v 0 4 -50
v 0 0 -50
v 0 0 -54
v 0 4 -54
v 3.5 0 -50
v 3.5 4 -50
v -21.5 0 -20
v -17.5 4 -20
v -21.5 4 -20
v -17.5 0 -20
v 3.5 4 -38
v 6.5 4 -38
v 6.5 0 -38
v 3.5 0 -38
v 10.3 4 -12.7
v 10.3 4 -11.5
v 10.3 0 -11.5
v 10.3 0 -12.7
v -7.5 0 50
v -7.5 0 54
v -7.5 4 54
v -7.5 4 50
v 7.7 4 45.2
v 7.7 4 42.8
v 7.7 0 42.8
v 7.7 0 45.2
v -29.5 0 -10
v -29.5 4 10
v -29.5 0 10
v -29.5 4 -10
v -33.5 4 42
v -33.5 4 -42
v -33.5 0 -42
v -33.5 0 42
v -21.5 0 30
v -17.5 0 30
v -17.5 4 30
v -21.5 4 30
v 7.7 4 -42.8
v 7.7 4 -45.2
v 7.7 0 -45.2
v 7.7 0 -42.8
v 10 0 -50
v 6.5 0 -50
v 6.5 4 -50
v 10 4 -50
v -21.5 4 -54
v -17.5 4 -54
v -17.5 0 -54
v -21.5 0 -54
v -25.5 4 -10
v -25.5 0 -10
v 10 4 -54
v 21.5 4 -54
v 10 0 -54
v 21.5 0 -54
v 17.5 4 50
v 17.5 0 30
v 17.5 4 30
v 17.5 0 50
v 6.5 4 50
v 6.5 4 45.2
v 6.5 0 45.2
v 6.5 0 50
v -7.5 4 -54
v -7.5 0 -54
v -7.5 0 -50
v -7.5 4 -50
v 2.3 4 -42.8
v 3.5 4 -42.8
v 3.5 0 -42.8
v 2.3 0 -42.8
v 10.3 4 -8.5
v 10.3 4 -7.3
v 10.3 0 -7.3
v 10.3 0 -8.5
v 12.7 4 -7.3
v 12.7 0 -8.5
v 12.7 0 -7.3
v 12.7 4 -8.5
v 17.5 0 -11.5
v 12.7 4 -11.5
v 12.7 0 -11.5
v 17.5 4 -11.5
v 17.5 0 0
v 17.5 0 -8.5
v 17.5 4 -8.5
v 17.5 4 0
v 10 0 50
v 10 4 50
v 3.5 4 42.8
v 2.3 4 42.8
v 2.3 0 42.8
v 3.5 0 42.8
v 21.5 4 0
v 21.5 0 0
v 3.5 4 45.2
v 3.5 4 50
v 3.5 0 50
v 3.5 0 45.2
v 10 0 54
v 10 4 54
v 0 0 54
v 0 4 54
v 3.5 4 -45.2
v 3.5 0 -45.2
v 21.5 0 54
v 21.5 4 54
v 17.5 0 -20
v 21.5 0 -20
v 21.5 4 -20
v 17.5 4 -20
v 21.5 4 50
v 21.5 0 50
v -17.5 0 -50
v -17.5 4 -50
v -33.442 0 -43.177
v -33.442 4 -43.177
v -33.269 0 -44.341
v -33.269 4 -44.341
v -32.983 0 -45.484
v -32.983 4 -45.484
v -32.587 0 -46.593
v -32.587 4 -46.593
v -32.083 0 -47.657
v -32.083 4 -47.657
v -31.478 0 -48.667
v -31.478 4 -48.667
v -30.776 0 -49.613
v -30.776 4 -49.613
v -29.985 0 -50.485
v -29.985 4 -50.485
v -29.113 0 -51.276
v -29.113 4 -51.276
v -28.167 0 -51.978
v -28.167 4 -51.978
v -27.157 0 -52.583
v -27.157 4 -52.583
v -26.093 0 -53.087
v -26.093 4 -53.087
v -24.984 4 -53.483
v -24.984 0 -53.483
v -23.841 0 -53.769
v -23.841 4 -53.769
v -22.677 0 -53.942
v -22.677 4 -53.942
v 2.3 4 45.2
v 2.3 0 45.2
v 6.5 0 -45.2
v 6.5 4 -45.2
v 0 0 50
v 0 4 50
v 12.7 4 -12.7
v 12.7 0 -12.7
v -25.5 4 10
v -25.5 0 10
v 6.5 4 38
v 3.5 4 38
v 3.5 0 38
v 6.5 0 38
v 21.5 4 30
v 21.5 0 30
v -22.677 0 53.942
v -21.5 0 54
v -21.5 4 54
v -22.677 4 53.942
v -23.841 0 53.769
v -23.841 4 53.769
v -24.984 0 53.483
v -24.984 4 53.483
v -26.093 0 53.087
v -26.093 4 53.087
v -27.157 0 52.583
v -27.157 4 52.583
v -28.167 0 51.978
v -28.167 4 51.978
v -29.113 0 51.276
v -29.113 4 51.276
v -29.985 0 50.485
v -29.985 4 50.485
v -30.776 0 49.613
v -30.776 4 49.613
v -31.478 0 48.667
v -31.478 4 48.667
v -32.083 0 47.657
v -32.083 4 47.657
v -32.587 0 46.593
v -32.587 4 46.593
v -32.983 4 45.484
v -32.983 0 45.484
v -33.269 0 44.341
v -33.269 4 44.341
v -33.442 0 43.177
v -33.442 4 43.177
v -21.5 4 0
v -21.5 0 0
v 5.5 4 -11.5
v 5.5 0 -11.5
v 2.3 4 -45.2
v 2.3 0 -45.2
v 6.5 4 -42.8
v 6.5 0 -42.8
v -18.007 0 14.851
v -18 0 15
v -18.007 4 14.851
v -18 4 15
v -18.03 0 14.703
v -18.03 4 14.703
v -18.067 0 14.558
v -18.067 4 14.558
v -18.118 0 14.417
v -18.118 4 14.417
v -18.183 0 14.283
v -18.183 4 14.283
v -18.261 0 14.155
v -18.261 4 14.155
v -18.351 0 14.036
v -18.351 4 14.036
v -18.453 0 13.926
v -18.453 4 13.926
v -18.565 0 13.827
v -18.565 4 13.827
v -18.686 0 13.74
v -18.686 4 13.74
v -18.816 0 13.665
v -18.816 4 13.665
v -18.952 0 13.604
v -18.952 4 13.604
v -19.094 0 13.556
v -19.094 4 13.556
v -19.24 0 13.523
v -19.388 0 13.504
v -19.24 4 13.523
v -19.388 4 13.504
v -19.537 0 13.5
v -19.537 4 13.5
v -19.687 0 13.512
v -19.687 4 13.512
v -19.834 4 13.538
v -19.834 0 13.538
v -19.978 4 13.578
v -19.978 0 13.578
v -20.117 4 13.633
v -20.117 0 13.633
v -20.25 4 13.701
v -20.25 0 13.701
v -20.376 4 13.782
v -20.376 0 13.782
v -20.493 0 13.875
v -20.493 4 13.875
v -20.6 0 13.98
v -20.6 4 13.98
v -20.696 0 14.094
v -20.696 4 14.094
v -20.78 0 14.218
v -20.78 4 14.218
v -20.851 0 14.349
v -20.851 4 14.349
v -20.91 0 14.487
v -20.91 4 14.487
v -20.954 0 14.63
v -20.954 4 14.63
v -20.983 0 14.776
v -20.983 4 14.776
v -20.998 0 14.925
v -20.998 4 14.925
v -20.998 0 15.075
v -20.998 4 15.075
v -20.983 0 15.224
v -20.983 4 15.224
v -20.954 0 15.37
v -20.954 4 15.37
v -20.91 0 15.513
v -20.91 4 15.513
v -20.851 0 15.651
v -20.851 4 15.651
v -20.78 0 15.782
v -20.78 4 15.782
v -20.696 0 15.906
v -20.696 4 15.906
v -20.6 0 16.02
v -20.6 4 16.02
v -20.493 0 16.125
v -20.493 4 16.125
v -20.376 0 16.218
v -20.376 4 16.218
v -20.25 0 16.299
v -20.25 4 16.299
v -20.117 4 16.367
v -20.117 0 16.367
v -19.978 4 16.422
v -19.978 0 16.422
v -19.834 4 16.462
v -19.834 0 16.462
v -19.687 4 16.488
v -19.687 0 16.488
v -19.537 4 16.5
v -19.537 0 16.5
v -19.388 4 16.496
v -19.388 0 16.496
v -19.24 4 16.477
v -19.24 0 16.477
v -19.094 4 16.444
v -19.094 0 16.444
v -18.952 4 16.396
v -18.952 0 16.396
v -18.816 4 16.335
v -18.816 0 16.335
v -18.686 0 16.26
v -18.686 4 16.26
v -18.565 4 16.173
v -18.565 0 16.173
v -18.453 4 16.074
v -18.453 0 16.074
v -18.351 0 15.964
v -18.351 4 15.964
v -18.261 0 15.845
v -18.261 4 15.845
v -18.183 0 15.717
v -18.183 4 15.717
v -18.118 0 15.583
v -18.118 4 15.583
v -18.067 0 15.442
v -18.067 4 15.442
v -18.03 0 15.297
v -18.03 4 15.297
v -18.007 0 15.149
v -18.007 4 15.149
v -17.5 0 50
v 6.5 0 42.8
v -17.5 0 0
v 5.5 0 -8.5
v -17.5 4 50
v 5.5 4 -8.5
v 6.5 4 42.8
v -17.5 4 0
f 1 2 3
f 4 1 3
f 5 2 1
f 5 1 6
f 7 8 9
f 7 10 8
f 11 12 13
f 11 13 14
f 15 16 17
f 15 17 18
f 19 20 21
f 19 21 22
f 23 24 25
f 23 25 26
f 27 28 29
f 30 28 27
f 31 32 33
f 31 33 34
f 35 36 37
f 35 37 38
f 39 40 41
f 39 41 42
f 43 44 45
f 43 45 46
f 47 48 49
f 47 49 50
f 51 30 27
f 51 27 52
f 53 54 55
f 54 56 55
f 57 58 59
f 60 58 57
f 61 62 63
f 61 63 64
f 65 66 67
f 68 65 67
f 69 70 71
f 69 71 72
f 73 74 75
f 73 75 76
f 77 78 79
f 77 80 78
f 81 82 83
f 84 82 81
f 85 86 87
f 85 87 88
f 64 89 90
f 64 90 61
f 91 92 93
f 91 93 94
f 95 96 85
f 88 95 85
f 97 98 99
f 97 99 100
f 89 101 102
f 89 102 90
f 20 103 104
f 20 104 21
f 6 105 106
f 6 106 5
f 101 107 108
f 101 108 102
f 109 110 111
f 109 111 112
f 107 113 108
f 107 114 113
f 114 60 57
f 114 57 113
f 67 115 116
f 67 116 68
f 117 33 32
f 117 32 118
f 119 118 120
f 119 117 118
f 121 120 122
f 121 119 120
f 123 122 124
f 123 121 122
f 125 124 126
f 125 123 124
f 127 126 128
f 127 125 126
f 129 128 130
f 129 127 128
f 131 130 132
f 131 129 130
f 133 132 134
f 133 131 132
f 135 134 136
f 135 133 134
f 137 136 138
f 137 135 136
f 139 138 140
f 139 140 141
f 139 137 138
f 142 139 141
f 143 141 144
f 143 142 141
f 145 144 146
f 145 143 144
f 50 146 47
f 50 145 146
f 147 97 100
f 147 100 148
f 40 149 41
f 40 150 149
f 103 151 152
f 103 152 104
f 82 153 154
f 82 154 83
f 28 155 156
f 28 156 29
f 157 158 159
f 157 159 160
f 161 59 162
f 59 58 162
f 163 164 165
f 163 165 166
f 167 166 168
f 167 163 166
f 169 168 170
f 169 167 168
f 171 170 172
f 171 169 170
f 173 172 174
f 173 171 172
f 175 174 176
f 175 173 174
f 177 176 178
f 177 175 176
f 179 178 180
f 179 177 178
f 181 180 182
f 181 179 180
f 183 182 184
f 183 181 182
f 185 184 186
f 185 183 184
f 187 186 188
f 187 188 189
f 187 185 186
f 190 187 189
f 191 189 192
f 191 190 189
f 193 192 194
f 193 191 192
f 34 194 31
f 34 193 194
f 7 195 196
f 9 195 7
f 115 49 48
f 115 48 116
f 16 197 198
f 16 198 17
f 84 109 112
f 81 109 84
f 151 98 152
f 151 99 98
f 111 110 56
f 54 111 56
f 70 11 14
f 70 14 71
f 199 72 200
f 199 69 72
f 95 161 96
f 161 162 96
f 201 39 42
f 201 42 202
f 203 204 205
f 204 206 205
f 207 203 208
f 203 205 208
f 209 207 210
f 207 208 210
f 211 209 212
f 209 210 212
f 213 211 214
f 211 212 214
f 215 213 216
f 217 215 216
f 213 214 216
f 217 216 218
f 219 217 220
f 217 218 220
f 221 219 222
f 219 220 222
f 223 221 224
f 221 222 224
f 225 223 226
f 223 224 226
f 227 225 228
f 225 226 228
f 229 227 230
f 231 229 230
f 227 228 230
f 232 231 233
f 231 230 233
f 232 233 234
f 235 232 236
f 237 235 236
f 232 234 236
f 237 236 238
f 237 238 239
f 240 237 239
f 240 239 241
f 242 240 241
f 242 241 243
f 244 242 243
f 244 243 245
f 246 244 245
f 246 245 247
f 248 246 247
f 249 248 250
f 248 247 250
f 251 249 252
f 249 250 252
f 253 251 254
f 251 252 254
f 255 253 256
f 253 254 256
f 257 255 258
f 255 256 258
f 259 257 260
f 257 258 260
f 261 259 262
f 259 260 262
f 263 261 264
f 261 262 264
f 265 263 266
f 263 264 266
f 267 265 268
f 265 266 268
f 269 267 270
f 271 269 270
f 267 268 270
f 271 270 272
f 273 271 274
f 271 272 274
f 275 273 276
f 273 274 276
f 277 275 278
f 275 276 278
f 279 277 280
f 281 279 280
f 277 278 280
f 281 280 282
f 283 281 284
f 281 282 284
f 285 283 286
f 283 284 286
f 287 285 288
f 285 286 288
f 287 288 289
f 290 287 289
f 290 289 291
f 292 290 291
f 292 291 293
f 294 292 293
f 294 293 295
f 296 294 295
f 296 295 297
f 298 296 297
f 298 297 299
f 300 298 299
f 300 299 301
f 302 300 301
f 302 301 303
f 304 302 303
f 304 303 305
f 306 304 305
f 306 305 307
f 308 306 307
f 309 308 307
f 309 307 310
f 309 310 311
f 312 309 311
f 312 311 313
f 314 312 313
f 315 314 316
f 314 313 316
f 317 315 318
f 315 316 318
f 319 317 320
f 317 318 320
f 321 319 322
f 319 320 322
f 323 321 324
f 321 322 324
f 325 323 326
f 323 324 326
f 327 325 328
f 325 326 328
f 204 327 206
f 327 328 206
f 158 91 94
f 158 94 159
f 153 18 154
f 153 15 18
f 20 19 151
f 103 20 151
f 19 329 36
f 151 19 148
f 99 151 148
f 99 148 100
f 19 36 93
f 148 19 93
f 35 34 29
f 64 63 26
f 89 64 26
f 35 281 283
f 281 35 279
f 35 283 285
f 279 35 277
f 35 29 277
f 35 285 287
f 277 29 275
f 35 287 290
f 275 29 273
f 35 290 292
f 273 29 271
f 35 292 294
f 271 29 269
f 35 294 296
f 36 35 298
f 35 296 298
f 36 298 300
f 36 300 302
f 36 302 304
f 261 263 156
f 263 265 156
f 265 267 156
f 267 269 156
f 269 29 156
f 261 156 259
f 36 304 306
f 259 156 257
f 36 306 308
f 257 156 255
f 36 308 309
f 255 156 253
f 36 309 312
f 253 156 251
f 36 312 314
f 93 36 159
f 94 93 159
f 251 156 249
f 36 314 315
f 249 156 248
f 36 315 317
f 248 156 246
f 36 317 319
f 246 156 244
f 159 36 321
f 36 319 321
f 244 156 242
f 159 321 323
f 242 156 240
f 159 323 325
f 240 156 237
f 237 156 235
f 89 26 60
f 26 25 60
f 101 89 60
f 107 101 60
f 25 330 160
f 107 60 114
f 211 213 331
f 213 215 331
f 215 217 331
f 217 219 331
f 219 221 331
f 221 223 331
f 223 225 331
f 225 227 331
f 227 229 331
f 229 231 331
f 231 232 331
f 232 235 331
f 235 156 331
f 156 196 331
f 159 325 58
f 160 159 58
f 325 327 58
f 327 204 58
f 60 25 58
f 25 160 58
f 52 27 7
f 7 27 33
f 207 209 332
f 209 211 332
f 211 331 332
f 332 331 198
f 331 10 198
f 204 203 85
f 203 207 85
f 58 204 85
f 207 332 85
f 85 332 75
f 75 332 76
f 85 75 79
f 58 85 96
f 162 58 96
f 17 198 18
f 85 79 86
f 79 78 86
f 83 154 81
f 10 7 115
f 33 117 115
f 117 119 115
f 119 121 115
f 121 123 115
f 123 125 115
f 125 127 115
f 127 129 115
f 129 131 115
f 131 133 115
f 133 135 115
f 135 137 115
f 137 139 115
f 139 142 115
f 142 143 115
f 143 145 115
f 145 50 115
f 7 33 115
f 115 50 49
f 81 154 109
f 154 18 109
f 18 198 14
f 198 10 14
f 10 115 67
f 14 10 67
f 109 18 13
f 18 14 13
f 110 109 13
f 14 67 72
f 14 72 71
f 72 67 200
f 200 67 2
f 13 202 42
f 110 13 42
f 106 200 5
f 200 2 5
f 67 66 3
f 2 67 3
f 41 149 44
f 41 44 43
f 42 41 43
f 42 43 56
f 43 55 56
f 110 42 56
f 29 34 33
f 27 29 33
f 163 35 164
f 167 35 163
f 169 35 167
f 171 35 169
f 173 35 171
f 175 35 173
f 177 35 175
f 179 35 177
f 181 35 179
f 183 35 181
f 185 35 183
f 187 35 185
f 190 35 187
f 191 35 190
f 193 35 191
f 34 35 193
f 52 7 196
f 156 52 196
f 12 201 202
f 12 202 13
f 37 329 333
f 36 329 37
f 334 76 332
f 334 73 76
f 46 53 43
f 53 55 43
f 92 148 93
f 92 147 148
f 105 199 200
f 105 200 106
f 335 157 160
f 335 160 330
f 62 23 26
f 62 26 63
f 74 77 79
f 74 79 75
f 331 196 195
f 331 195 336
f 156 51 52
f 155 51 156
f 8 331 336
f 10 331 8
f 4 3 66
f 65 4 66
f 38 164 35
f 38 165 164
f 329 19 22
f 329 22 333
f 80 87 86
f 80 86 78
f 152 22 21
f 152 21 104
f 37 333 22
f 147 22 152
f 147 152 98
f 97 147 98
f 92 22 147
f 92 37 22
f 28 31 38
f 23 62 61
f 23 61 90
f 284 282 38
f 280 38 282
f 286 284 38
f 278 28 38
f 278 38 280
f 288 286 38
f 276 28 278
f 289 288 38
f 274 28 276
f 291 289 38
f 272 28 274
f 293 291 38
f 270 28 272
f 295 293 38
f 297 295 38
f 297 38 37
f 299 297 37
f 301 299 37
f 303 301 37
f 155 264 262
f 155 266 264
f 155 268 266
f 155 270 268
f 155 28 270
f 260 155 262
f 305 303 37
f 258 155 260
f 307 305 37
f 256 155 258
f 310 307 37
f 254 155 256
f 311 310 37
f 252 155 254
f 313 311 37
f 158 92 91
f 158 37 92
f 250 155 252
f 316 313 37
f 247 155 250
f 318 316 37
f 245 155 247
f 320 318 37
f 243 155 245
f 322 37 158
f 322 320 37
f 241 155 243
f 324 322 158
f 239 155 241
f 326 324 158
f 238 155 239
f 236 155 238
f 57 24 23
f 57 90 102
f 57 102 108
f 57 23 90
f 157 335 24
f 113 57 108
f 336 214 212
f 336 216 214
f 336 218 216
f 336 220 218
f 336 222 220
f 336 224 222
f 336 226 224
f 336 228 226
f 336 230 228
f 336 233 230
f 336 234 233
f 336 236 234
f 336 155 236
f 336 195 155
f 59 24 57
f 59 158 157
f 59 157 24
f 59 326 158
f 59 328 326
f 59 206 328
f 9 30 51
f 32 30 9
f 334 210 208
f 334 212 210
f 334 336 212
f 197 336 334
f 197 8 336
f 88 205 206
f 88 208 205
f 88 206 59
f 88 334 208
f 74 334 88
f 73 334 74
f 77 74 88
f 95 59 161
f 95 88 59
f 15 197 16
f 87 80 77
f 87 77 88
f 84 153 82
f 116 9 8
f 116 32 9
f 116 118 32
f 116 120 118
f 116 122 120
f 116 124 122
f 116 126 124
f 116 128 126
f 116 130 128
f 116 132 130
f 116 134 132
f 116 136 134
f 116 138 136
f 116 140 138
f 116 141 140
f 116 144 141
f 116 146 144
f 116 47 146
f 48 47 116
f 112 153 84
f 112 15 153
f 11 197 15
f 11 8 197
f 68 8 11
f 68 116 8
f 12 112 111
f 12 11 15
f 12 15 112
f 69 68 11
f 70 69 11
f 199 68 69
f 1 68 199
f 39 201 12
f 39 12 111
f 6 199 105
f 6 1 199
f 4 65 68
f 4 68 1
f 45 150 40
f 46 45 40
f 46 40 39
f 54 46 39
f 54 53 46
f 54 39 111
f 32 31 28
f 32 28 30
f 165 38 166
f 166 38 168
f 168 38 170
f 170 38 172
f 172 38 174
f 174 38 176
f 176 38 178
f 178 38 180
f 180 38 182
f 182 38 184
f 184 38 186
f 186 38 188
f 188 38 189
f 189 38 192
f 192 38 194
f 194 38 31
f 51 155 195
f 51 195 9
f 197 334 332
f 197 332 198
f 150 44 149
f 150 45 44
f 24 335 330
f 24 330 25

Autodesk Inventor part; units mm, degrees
ref_plane "YZ Plane" through (0, 0, 0) normal (1, 0, 0) x (0, 1, 0)
ref_plane "XZ Plane" through (0, 0, 0) normal (0, 1, 0) x (-1, 0, 0)
ref_plane "XY Plane" through (0, 0, 0) normal (0, 0, 1) x (1, 0, 0)
sketch "Sketch1" plane through (0, 0, 0) normal (0, 1, 0) x (-1, 0, 0)
  line L0 (-17.5, 50) -> (17.5, 50)
  line L1 (17.5, 50) -> (17.5, -50)
  line L2 (17.5, -50) -> (-17.5, -50)
  line L3 (-17.5, -50) -> (-17.5, 50)
  line L4 (-17.5, 50) -> (17.5, -50) construction
  line L5 (17.5, 50) -> (-17.5, -50) construction
  line L6 (7.5, 50) -> (0, 50)
  line L7 (0, 50) -> (0, 54)
  line L8 (0, 54) -> (7.5, 54)
  line L9 (7.5, 54) -> (7.5, 50)
  line L10 (-10, 50) -> (-21.5, 50)
  line L11 (-21.5, 50) -> (-21.5, 54)
  line L12 (-21.5, 54) -> (-10, 54)
  line L13 (-10, 54) -> (-10, 50)
  line L14 (17.5, 30) -> (21.5, 30)
  line L15 (21.5, 30) -> (21.5, 0)
  line L16 (21.5, 0) -> (17.5, 0)
  line L17 (17.5, 0) -> (17.5, 30)
  line L18 (17.5, -20) -> (21.5, -20)
  line L19 (21.5, -20) -> (21.5, -54)
  line L20 (21.5, -54) -> (17.5, -54)
  line L21 (17.5, -54) -> (17.5, -20)
  line L22 (7.5, -50) -> (0, -50)
  line L23 (0, -50) -> (0, -54)
  line L24 (0, -54) -> (7.5, -54)
  line L25 (7.5, -54) -> (7.5, -50)
  line L26 (-10, -50) -> (-21.5, -50)
  line L27 (-21.5, -50) -> (-21.5, -54)
  line L28 (-21.5, -54) -> (-10, -54)
  line L29 (-10, -54) -> (-10, -50)
  line L30 (-17.5, 30) -> (-21.5, 30)
  line L31 (-21.5, 30) -> (-21.5, 0)
  line L32 (-21.5, 0) -> (-17.5, 0)
  line L33 (-17.5, 0) -> (-17.5, 30)
  line L34 (-17.5, -50) -> (-21.5, -50)
  line L35 (-21.5, -50) -> (-21.5, -20)
  line L36 (-21.5, -20) -> (-17.5, -20)
  line L37 (-17.5, -20) -> (-17.5, -50)
  point P0 (0, 0)
  point P1 (17.5, 0)
  point P2 (-17.5, 50)
  point P3 (-17.5, 0)
  point P4 (-21.5, -50)
  point P5 (17.5, -50)
  point P6 (19.5, -54)
  dimension "d0" = 35
  dimension "d2" = 7.5
  dimension "d3" = 4
  dimension "d4" = 11.5
  dimension "d5" = 4
  dimension "d6" = 10
  dimension "d7" = 10
  dimension "d8" = 4
  dimension "d9" = 30
  dimension "d10" = 4
  dimension "d11" = 34
  dimension "d12" = 20
  dimension "d13" = 20
  dimension "d14" = 7.5
  dimension "d15" = 4
  dimension "d16" = 11.5
  dimension "d17" = 4
  dimension "d18" = 10
  dimension "d19" = 10
  dimension "d20" = 4
  dimension "d21" = 30
  dimension "d22" = 20
  dimension "d23" = 4
  dimension "d24" = 30
  dimension "d27" = 4
extrude "Extrusion1" add sketch "Sketch1" along normal blind 4
sketch "Sketch2" plane through (0, 4, 0) normal (0, 1, 0) x (1, 0, 0)
  line L0 (-21.5, 54) -> (-33.5, 54)
  line L1 (-33.5, 54) -> (-33.5, -54)
  line L2 (-33.5, -54) -> (-21.5, -54)
  line L3 (-21.5, -54) -> (-21.5, 54)
  line L4 (-21.5, 54) -> (-21.5, 20) projected
  line L5 (-21.5, 20) -> (-17.5, 20) projected
  line L6 (-17.5, 20) -> (-17.5, 0) projected
  line L7 (-17.5, 0) -> (-21.5, 0) projected
  line L8 (-21.5, 0) -> (-21.5, -30) projected
  line L9 (-21.5, -30) -> (-17.5, -30) projected
  line L10 (-17.5, -30) -> (-17.5, -50) projected
  line L11 (-17.5, -50) -> (-7.5, -50) projected
  line L12 (-7.5, -50) -> (-7.5, -54) projected
  line L13 (-7.5, -54) -> (0, -54) projected
  line L14 (0, -54) -> (0, -50) projected
  line L15 (0, -50) -> (10, -50) projected
  line L16 (10, -50) -> (10, -54) projected
  line L17 (10, -54) -> (21.5, -54) projected
  line L18 (21.5, -54) -> (21.5, -50) projected
  line L19 (21.5, -50) -> (17.5, -50) projected
  line L20 (17.5, -50) -> (17.5, -30) projected
  line L21 (17.5, -30) -> (21.5, -30) projected
  line L22 (21.5, -30) -> (21.5, 0) projected
  line L23 (21.5, 0) -> (17.5, 0) projected
  line L24 (17.5, 0) -> (17.5, 20) projected
  line L25 (17.5, 20) -> (21.5, 20) projected
  line L26 (21.5, 20) -> (21.5, 54) projected
  line L27 (21.5, 54) -> (10, 54) projected
  line L28 (10, 54) -> (10, 50) projected
  line L29 (10, 50) -> (0, 50) projected
  line L30 (0, 50) -> (0, 54) projected
  line L31 (0, 54) -> (-7.5, 54) projected
  line L32 (-7.5, 54) -> (-7.5, 50) projected
  line L33 (-7.5, 50) -> (-17.5, 50) projected
  line L34 (-17.5, 50) -> (-17.5, 54) projected
  line L35 (-17.5, 54) -> (-21.5, 54) projected
  line L36 (-7.5, -54) -> (0, -54) projected
  line L37 (-33.5, 54) -> (21.5, -54) construction
  line L38 (-29.5, 10) -> (-25.5, 10)
  line L39 (-25.5, 10) -> (-25.5, -10)
  line L40 (-25.5, -10) -> (-29.5, -10)
  line L41 (-29.5, -10) -> (-29.5, 10)
  point P0 (0, 0)
  point P1 (-6, 0)
  point P2 (-25.5, 0)
  dimension "d28" = 51
  dimension "d34" = 20
  dimension "d35" = 4
  dimension "d36" = 4
extrude "Extrusion2" add sketch "Sketch2" against normal up to surface (4 mm away) contours L3 L2 L1 L0
sketch "Sketch3" plane through (0, 4, 0) normal (0, 1, 0) x (1, 0, 0)
  line L0 (3.5, 45.2) -> (3.5, 50) projected
  line L1 (3.5, 50) -> (0, 50) projected
  line L2 (0, 50) -> (0, 54) construction
  line L3 (0, 54) -> (-7.5, 54) construction
  line L4 (-7.5, 54) -> (-7.5, 50) construction
  line L5 (-7.5, 50) -> (-17.5, 50) construction
  line L6 (-17.5, 50) -> (-17.5, 54) construction
  line L7 (-17.5, 54) -> (-21.5, 54) construction
  line L8 (-17.5, 0) -> (-21.5, 0) construction
  line L9 (-21.5, 0) -> (-21.5, -30) construction
  line L10 (-21.5, -30) -> (-17.5, -30) construction
  line L11 (-17.5, -30) -> (-17.5, -50) construction
  line L12 (-17.5, -50) -> (-7.5, -50) construction
  line L13 (-7.5, -50) -> (-7.5, -54) construction
  line L14 (-7.5, -54) -> (0, -54) construction
  line L15 (0, -54) -> (0, -50) construction
  line L16 (0, -50) -> (3.5, -50) projected
  line L17 (3.5, -50) -> (3.5, -45.2) projected
  line L18 (3.5, -45.2) -> (2.3, -45.2) projected
  line L19 (2.3, -45.2) -> (2.3, -42.8) projected
  line L20 (2.3, -42.8) -> (3.5, -42.8) projected
  line L21 (3.5, -42.8) -> (3.5, -38) projected
  line L22 (3.5, -38) -> (6.5, -38) projected
  line L23 (6.5, -38) -> (6.5, -42.8) projected
  line L24 (6.5, -42.8) -> (7.7, -42.8) projected
  line L25 (7.7, -42.8) -> (7.7, -45.2) projected
  line L26 (7.7, -45.2) -> (6.5, -45.2) projected
  line L27 (6.5, -45.2) -> (6.5, -50) projected
  line L28 (6.5, -50) -> (10, -50) construction
  line L29 (10, -50) -> (10, -54) construction
  line L30 (10, -54) -> (21.5, -54) construction
  line L31 (21.5, -54) -> (21.5, -50) construction
  line L32 (21.5, -50) -> (17.5, -50) construction
  line L33 (17.5, -50) -> (17.5, -30) construction
  line L34 (17.5, -30) -> (21.5, -30) construction
  line L35 (21.5, 0) -> (17.5, 0) construction
  line L36 (17.5, 0) -> (17.5, 8.5) construction
  line L37 (17.5, 8.5) -> (12.7, 8.5) projected
  line L38 (12.7, 8.5) -> (12.7, 7.3) projected
  line L39 (12.7, 7.3) -> (10.3, 7.3) projected
  line L40 (10.3, 7.3) -> (10.3, 8.5) projected
  line L41 (10.3, 8.5) -> (5.5, 8.5) projected
  line L42 (5.5, 8.5) -> (5.5, 11.5) projected
  line L43 (5.5, 11.5) -> (10.3, 11.5) projected
  line L44 (10.3, 11.5) -> (10.3, 12.7) projected
  line L45 (10.3, 12.7) -> (12.7, 12.7) projected
  line L46 (12.7, 12.7) -> (12.7, 11.5) projected
  line L47 (12.7, 11.5) -> (17.5, 11.5) projected
  line L48 (17.5, 11.5) -> (17.5, 20) construction
  line L49 (17.5, 20) -> (21.5, 20) construction
  line L50 (21.5, 20) -> (21.5, 54) construction
  line L51 (21.5, 54) -> (10, 54) construction
  line L52 (10, 54) -> (10, 50) construction
  line L53 (10, 50) -> (6.5, 50) projected
  line L54 (6.5, 50) -> (6.5, 45.2) projected
  line L55 (6.5, 45.2) -> (7.7, 45.2) projected
  line L56 (7.7, 45.2) -> (7.7, 42.8) projected
  line L57 (7.7, 42.8) -> (6.5, 42.8) projected
  line L58 (6.5, 42.8) -> (6.5, 38) projected
  line L59 (6.5, 38) -> (3.5, 38) projected
  line L60 (3.5, 38) -> (3.5, 42.8) projected
  line L61 (3.5, 42.8) -> (2.3, 42.8) projected
  line L62 (2.3, 42.8) -> (2.3, 45.2) projected
  line L63 (2.3, 45.2) -> (3.5, 45.2) projected
  circle A0 centre (-19.5, -15) radius 1.5 projected
  line L64 (-21.5, -30) -> (-17.5, -30) construction
  line L65 (-17.5, -30) -> (-17.5, -50) construction
  line L66 (-17.5, -50) -> (-7.5, -50) construction
  line L67 (-7.5, -50) -> (-7.5, -54) construction
  line L68 (-7.5, -54) -> (0, -54) construction
  line L69 (0, -54) -> (0, -50) construction
  line L70 (0, -50) -> (10, -50) projected
  line L71 (10, -50) -> (10, -54) construction
  line L72 (10, -54) -> (21.5, -54) construction
  line L73 (21.5, -54) -> (21.5, -50) construction
  line L74 (21.5, -50) -> (17.5, -50) construction
  line L75 (17.5, -50) -> (17.5, -30) construction
  line L76 (17.5, -30) -> (21.5, -30) construction
  line L77 (21.5, -30) -> (21.5, 0) construction
  line L78 (21.5, 0) -> (17.5, 0) construction
  line L79 (17.5, 0) -> (17.5, 20) projected
  line L80 (17.5, 20) -> (21.5, 20) construction
  line L81 (21.5, 20) -> (21.5, 54) construction
  line L82 (21.5, 54) -> (10, 54) construction
  line L83 (10, 54) -> (10, 50) construction
  line L84 (10, 50) -> (0, 50) projected
  line L85 (0, 50) -> (0, 54) construction
  line L86 (0, 54) -> (-7.5, 54) construction
  line L87 (-7.5, 54) -> (-7.5, 50) construction
  line L88 (-7.5, 50) -> (-17.5, 50) construction
  line L89 (-17.5, 50) -> (-17.5, 54) construction
  line L90 (-17.5, 54) -> (-33.5, 54) construction
  line L91 (-33.5, 54) -> (-33.5, -54) construction
  line L92 (-33.5, -54) -> (-21.5, -54) construction
  line L93 (-21.5, -54) -> (-21.5, -30) construction
  line L94 (-29.5, 10) -> (-25.5, 10) construction
  line L95 (-25.5, 10) -> (-25.5, -10) construction
  line L96 (-25.5, -10) -> (-29.5, -10) construction
  line L97 (-29.5, -10) -> (-29.5, 10) construction
  line L98 (-21.5, 0) -> (-21.5, 20) construction
  line L99 (-21.5, 20) -> (-17.5, 20) construction
  line L100 (-17.5, 20) -> (-17.5, 0) projected
  line L101 (-17.5, 0) -> (-21.5, 0) construction
  point P0 (0, 0)
  point P1 (-17.5, 11.5)
  point P2 (-12.7, 8.5)
extrude "Extrusion3" cut sketch "Sketch3" against normal up to next
fillet "Fillet1" radius 12 2 edges at (-33.5, 2, 54) (-33.5, 2, -54)
properties part number "FloorButtonHolder_Bottom_V1_B" material "MDF Medium Density Fiberboard"
